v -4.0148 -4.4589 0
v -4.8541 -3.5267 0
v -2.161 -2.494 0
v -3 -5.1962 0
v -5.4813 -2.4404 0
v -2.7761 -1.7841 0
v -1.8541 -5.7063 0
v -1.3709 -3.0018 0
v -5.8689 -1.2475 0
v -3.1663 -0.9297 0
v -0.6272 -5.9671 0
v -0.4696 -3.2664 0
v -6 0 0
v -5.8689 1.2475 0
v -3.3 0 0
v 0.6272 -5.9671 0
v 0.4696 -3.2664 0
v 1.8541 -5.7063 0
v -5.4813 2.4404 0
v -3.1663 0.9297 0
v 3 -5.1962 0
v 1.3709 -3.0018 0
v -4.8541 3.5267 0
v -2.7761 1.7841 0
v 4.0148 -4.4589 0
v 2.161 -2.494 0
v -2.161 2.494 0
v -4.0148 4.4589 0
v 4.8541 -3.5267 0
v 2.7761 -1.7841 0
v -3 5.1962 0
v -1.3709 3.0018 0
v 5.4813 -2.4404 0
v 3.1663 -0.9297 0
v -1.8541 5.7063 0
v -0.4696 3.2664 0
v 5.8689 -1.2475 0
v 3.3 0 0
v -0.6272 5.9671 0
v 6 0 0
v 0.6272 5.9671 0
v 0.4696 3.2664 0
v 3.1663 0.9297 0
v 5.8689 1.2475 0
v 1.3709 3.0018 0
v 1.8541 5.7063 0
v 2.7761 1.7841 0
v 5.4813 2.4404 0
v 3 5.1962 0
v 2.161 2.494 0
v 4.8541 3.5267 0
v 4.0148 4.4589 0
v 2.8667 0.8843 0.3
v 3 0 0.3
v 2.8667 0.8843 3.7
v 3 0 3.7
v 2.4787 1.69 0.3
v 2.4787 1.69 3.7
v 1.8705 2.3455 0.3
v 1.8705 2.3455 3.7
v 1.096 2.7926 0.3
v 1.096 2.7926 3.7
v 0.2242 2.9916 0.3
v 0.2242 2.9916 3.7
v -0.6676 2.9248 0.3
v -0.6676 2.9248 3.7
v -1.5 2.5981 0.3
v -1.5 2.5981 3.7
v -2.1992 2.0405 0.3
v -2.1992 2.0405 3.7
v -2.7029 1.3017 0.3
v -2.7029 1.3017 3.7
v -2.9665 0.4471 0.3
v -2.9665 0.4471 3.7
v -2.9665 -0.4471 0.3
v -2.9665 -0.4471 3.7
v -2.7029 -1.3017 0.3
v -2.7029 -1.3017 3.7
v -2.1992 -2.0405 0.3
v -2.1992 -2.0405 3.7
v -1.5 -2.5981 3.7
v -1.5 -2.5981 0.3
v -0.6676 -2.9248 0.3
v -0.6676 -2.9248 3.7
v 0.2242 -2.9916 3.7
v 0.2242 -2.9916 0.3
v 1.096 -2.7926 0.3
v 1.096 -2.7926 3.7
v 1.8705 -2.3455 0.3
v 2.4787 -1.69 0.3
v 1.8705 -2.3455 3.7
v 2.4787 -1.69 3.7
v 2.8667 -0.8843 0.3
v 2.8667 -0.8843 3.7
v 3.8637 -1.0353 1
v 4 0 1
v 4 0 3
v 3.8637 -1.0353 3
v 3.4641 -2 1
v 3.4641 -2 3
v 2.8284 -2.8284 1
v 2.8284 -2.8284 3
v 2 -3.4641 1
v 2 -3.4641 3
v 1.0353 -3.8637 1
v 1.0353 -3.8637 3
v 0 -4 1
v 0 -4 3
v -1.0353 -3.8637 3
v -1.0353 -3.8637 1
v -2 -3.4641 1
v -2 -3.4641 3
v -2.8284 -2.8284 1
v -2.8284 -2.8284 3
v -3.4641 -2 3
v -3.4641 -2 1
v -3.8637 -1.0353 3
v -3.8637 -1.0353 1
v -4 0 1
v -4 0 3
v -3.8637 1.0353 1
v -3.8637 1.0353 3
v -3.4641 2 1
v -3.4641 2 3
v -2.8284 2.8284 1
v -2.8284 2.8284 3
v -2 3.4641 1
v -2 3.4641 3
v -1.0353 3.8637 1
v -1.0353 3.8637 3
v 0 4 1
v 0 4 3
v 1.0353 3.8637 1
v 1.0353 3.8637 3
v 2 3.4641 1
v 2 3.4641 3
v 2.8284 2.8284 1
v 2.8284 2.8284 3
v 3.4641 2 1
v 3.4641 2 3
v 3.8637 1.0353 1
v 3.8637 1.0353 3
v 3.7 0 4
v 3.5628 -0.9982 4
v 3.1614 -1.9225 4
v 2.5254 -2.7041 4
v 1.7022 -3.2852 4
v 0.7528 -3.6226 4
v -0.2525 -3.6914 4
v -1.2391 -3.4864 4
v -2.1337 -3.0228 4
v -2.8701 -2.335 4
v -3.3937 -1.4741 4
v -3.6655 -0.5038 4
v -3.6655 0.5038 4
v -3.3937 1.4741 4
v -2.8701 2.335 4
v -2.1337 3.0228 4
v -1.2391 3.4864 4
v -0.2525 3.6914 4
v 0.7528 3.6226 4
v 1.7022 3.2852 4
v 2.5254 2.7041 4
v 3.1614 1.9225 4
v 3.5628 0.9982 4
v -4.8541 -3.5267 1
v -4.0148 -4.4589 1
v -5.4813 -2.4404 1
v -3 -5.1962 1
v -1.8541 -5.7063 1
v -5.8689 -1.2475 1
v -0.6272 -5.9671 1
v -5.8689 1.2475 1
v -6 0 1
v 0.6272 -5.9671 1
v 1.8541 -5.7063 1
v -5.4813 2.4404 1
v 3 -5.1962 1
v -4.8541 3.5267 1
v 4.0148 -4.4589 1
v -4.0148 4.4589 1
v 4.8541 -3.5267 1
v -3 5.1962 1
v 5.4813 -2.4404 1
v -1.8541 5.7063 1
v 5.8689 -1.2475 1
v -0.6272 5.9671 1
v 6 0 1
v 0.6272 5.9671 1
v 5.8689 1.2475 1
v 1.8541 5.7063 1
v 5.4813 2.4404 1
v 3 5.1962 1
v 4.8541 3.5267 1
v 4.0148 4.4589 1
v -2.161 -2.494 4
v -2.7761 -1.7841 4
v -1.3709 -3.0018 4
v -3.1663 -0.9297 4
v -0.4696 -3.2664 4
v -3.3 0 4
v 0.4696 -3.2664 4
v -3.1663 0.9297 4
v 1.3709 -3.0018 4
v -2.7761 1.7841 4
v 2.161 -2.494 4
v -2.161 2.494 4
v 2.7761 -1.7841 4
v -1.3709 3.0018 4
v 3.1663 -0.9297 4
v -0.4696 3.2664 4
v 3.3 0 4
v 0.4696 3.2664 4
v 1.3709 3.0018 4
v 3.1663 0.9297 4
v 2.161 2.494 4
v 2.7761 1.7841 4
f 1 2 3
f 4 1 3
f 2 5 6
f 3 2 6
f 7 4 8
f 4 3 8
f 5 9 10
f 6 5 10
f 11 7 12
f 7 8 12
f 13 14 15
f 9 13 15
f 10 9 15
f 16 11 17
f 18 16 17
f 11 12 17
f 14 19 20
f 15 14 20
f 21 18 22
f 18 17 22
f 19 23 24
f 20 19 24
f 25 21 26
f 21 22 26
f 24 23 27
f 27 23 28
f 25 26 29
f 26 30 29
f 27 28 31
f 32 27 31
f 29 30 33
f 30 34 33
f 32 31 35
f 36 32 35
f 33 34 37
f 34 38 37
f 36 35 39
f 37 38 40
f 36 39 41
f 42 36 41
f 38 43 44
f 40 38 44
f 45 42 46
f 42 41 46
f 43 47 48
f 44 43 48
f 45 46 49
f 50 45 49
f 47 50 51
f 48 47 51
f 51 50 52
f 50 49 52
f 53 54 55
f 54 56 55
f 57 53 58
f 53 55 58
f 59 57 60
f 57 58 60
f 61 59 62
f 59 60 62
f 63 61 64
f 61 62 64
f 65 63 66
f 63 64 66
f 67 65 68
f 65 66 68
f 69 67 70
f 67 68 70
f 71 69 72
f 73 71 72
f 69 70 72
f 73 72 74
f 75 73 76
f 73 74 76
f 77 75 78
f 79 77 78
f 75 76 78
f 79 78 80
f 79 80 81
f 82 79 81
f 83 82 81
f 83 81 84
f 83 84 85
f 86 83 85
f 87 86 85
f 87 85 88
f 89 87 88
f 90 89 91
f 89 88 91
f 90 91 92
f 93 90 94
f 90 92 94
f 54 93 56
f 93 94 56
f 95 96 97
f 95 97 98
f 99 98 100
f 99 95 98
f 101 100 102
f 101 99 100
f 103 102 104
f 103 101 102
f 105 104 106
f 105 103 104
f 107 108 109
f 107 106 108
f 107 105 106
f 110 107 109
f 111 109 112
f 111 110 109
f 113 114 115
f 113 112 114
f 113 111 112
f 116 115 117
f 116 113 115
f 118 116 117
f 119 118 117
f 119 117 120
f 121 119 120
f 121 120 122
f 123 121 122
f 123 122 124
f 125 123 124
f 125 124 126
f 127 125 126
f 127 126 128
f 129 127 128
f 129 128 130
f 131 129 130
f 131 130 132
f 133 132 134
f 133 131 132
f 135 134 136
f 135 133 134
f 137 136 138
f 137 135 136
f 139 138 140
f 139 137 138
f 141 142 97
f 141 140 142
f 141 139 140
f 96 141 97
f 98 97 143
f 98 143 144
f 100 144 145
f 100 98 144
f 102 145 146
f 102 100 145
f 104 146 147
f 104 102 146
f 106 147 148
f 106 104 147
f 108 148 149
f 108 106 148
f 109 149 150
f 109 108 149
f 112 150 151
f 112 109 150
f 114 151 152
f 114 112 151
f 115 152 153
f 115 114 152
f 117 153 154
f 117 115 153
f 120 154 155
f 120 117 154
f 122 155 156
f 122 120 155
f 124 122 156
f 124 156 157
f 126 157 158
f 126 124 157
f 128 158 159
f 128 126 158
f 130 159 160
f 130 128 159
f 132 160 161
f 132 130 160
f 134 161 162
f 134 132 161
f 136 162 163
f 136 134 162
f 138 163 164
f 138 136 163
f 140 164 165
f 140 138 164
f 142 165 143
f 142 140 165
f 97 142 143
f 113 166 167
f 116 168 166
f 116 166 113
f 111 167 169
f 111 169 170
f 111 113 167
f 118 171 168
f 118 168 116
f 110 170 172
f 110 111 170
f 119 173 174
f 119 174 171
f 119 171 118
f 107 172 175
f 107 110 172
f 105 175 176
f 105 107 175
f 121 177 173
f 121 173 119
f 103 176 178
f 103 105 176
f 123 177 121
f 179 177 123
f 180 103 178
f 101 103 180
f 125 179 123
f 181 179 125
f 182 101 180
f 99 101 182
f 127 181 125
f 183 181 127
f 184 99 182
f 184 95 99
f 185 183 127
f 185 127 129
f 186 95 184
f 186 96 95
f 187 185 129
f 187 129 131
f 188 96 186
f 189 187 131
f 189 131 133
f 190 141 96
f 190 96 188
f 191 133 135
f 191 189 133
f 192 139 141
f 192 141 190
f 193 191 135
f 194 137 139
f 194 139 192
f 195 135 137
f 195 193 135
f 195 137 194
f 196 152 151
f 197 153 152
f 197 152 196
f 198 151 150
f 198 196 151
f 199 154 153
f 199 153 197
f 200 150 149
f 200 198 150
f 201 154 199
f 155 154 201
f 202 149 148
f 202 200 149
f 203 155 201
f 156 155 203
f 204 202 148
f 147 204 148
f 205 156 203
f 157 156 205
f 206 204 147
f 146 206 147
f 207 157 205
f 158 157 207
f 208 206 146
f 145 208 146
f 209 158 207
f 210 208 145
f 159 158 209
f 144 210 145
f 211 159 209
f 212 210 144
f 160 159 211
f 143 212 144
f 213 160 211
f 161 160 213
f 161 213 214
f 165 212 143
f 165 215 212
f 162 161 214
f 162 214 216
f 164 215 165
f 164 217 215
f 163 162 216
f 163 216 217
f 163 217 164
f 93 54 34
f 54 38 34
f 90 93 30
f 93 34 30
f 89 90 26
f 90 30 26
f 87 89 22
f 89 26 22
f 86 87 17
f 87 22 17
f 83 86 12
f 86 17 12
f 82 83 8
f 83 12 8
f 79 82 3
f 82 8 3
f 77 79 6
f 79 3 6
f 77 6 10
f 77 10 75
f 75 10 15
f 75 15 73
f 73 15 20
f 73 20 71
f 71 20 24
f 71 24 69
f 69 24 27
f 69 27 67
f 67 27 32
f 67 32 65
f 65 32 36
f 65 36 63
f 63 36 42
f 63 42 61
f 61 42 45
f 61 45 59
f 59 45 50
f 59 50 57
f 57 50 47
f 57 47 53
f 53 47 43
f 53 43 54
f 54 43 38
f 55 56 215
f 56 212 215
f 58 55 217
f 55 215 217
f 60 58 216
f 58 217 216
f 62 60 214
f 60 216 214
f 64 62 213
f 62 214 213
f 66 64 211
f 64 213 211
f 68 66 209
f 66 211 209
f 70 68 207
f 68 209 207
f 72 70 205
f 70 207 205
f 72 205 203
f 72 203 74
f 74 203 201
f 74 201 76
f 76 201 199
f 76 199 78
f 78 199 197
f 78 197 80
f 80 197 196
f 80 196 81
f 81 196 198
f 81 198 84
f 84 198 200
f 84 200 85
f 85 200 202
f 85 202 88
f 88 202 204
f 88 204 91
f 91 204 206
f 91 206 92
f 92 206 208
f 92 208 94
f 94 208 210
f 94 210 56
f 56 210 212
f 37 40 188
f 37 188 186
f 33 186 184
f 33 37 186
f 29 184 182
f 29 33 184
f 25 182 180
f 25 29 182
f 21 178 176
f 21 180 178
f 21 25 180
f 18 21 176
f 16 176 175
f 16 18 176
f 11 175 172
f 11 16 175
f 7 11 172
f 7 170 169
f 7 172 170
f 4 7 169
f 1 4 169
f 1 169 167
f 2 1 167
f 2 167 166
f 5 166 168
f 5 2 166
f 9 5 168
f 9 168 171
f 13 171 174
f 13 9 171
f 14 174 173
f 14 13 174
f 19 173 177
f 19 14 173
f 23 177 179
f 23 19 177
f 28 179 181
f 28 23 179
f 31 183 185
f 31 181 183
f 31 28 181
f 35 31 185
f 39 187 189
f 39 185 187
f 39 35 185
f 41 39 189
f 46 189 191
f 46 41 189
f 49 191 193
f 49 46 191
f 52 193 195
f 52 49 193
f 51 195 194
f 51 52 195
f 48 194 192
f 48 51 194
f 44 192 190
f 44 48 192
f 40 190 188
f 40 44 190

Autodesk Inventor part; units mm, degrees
ref_plane "YZ Plane" through (0, 0, 0) normal (1, 0, 0) x (0, 1, 0)
ref_plane "XZ Plane" through (0, 0, 0) normal (0, 1, 0) x (-1, 0, 0)
ref_plane "XY Plane" through (0, 0, 0) normal (0, 0, 1) x (1, 0, 0)
sketch "スケッチ1" plane through (0, 0, 0) normal (0, 1, 0) x (-1, 0, 0)
  line L0 (-3, 0.3) -> (-3, 3.7)
  line L1 (-3.3, 4) -> (-3.7, 4)
  line L2 (-4, 3) -> (-4, 1)
  line L3 (-4, 1) -> (-6, 1)
  line L4 (-6, 1) -> (-6, 0)
  line L5 (-6, 0) -> (-3.3, 0)
  line L6 (-3, 3.7) -> (-3.3, 4)
  line L7 (-3, 0.3) -> (-3.3, 0)
  line L8 (-3.7, 4) -> (-4, 3)
  line L9 (0, -0.8) -> (0, 4.8) projected
  point P0 (0, 0)
  point P1 (-3, 0)
  point P2 (-3, 4)
  point P3 (-4, 4)
  dimension "d2" = 1
  dimension "d9" = 1
  dimension "d11" = 6
  dimension "d12" = 8
  dimension "d13" = 12
  dimension "d14" = 0.3
  dimension "d15" = 0.3
  dimension "d16" = 0.3
  dimension "d17" = 0.3
  dimension "d18" = 0.3
  dimension "d19" = 4
revolve "回転1" add sketch "スケッチ1" angle 360 about axis through (0, 0, -10) along (0, 0, 1)
equation "\"d15\" = d14"
equation "\"d16\" = d14"
equation "\"d17\" = d16"
equation "\"d18\" = d14"
properties part number "80F-0603"
